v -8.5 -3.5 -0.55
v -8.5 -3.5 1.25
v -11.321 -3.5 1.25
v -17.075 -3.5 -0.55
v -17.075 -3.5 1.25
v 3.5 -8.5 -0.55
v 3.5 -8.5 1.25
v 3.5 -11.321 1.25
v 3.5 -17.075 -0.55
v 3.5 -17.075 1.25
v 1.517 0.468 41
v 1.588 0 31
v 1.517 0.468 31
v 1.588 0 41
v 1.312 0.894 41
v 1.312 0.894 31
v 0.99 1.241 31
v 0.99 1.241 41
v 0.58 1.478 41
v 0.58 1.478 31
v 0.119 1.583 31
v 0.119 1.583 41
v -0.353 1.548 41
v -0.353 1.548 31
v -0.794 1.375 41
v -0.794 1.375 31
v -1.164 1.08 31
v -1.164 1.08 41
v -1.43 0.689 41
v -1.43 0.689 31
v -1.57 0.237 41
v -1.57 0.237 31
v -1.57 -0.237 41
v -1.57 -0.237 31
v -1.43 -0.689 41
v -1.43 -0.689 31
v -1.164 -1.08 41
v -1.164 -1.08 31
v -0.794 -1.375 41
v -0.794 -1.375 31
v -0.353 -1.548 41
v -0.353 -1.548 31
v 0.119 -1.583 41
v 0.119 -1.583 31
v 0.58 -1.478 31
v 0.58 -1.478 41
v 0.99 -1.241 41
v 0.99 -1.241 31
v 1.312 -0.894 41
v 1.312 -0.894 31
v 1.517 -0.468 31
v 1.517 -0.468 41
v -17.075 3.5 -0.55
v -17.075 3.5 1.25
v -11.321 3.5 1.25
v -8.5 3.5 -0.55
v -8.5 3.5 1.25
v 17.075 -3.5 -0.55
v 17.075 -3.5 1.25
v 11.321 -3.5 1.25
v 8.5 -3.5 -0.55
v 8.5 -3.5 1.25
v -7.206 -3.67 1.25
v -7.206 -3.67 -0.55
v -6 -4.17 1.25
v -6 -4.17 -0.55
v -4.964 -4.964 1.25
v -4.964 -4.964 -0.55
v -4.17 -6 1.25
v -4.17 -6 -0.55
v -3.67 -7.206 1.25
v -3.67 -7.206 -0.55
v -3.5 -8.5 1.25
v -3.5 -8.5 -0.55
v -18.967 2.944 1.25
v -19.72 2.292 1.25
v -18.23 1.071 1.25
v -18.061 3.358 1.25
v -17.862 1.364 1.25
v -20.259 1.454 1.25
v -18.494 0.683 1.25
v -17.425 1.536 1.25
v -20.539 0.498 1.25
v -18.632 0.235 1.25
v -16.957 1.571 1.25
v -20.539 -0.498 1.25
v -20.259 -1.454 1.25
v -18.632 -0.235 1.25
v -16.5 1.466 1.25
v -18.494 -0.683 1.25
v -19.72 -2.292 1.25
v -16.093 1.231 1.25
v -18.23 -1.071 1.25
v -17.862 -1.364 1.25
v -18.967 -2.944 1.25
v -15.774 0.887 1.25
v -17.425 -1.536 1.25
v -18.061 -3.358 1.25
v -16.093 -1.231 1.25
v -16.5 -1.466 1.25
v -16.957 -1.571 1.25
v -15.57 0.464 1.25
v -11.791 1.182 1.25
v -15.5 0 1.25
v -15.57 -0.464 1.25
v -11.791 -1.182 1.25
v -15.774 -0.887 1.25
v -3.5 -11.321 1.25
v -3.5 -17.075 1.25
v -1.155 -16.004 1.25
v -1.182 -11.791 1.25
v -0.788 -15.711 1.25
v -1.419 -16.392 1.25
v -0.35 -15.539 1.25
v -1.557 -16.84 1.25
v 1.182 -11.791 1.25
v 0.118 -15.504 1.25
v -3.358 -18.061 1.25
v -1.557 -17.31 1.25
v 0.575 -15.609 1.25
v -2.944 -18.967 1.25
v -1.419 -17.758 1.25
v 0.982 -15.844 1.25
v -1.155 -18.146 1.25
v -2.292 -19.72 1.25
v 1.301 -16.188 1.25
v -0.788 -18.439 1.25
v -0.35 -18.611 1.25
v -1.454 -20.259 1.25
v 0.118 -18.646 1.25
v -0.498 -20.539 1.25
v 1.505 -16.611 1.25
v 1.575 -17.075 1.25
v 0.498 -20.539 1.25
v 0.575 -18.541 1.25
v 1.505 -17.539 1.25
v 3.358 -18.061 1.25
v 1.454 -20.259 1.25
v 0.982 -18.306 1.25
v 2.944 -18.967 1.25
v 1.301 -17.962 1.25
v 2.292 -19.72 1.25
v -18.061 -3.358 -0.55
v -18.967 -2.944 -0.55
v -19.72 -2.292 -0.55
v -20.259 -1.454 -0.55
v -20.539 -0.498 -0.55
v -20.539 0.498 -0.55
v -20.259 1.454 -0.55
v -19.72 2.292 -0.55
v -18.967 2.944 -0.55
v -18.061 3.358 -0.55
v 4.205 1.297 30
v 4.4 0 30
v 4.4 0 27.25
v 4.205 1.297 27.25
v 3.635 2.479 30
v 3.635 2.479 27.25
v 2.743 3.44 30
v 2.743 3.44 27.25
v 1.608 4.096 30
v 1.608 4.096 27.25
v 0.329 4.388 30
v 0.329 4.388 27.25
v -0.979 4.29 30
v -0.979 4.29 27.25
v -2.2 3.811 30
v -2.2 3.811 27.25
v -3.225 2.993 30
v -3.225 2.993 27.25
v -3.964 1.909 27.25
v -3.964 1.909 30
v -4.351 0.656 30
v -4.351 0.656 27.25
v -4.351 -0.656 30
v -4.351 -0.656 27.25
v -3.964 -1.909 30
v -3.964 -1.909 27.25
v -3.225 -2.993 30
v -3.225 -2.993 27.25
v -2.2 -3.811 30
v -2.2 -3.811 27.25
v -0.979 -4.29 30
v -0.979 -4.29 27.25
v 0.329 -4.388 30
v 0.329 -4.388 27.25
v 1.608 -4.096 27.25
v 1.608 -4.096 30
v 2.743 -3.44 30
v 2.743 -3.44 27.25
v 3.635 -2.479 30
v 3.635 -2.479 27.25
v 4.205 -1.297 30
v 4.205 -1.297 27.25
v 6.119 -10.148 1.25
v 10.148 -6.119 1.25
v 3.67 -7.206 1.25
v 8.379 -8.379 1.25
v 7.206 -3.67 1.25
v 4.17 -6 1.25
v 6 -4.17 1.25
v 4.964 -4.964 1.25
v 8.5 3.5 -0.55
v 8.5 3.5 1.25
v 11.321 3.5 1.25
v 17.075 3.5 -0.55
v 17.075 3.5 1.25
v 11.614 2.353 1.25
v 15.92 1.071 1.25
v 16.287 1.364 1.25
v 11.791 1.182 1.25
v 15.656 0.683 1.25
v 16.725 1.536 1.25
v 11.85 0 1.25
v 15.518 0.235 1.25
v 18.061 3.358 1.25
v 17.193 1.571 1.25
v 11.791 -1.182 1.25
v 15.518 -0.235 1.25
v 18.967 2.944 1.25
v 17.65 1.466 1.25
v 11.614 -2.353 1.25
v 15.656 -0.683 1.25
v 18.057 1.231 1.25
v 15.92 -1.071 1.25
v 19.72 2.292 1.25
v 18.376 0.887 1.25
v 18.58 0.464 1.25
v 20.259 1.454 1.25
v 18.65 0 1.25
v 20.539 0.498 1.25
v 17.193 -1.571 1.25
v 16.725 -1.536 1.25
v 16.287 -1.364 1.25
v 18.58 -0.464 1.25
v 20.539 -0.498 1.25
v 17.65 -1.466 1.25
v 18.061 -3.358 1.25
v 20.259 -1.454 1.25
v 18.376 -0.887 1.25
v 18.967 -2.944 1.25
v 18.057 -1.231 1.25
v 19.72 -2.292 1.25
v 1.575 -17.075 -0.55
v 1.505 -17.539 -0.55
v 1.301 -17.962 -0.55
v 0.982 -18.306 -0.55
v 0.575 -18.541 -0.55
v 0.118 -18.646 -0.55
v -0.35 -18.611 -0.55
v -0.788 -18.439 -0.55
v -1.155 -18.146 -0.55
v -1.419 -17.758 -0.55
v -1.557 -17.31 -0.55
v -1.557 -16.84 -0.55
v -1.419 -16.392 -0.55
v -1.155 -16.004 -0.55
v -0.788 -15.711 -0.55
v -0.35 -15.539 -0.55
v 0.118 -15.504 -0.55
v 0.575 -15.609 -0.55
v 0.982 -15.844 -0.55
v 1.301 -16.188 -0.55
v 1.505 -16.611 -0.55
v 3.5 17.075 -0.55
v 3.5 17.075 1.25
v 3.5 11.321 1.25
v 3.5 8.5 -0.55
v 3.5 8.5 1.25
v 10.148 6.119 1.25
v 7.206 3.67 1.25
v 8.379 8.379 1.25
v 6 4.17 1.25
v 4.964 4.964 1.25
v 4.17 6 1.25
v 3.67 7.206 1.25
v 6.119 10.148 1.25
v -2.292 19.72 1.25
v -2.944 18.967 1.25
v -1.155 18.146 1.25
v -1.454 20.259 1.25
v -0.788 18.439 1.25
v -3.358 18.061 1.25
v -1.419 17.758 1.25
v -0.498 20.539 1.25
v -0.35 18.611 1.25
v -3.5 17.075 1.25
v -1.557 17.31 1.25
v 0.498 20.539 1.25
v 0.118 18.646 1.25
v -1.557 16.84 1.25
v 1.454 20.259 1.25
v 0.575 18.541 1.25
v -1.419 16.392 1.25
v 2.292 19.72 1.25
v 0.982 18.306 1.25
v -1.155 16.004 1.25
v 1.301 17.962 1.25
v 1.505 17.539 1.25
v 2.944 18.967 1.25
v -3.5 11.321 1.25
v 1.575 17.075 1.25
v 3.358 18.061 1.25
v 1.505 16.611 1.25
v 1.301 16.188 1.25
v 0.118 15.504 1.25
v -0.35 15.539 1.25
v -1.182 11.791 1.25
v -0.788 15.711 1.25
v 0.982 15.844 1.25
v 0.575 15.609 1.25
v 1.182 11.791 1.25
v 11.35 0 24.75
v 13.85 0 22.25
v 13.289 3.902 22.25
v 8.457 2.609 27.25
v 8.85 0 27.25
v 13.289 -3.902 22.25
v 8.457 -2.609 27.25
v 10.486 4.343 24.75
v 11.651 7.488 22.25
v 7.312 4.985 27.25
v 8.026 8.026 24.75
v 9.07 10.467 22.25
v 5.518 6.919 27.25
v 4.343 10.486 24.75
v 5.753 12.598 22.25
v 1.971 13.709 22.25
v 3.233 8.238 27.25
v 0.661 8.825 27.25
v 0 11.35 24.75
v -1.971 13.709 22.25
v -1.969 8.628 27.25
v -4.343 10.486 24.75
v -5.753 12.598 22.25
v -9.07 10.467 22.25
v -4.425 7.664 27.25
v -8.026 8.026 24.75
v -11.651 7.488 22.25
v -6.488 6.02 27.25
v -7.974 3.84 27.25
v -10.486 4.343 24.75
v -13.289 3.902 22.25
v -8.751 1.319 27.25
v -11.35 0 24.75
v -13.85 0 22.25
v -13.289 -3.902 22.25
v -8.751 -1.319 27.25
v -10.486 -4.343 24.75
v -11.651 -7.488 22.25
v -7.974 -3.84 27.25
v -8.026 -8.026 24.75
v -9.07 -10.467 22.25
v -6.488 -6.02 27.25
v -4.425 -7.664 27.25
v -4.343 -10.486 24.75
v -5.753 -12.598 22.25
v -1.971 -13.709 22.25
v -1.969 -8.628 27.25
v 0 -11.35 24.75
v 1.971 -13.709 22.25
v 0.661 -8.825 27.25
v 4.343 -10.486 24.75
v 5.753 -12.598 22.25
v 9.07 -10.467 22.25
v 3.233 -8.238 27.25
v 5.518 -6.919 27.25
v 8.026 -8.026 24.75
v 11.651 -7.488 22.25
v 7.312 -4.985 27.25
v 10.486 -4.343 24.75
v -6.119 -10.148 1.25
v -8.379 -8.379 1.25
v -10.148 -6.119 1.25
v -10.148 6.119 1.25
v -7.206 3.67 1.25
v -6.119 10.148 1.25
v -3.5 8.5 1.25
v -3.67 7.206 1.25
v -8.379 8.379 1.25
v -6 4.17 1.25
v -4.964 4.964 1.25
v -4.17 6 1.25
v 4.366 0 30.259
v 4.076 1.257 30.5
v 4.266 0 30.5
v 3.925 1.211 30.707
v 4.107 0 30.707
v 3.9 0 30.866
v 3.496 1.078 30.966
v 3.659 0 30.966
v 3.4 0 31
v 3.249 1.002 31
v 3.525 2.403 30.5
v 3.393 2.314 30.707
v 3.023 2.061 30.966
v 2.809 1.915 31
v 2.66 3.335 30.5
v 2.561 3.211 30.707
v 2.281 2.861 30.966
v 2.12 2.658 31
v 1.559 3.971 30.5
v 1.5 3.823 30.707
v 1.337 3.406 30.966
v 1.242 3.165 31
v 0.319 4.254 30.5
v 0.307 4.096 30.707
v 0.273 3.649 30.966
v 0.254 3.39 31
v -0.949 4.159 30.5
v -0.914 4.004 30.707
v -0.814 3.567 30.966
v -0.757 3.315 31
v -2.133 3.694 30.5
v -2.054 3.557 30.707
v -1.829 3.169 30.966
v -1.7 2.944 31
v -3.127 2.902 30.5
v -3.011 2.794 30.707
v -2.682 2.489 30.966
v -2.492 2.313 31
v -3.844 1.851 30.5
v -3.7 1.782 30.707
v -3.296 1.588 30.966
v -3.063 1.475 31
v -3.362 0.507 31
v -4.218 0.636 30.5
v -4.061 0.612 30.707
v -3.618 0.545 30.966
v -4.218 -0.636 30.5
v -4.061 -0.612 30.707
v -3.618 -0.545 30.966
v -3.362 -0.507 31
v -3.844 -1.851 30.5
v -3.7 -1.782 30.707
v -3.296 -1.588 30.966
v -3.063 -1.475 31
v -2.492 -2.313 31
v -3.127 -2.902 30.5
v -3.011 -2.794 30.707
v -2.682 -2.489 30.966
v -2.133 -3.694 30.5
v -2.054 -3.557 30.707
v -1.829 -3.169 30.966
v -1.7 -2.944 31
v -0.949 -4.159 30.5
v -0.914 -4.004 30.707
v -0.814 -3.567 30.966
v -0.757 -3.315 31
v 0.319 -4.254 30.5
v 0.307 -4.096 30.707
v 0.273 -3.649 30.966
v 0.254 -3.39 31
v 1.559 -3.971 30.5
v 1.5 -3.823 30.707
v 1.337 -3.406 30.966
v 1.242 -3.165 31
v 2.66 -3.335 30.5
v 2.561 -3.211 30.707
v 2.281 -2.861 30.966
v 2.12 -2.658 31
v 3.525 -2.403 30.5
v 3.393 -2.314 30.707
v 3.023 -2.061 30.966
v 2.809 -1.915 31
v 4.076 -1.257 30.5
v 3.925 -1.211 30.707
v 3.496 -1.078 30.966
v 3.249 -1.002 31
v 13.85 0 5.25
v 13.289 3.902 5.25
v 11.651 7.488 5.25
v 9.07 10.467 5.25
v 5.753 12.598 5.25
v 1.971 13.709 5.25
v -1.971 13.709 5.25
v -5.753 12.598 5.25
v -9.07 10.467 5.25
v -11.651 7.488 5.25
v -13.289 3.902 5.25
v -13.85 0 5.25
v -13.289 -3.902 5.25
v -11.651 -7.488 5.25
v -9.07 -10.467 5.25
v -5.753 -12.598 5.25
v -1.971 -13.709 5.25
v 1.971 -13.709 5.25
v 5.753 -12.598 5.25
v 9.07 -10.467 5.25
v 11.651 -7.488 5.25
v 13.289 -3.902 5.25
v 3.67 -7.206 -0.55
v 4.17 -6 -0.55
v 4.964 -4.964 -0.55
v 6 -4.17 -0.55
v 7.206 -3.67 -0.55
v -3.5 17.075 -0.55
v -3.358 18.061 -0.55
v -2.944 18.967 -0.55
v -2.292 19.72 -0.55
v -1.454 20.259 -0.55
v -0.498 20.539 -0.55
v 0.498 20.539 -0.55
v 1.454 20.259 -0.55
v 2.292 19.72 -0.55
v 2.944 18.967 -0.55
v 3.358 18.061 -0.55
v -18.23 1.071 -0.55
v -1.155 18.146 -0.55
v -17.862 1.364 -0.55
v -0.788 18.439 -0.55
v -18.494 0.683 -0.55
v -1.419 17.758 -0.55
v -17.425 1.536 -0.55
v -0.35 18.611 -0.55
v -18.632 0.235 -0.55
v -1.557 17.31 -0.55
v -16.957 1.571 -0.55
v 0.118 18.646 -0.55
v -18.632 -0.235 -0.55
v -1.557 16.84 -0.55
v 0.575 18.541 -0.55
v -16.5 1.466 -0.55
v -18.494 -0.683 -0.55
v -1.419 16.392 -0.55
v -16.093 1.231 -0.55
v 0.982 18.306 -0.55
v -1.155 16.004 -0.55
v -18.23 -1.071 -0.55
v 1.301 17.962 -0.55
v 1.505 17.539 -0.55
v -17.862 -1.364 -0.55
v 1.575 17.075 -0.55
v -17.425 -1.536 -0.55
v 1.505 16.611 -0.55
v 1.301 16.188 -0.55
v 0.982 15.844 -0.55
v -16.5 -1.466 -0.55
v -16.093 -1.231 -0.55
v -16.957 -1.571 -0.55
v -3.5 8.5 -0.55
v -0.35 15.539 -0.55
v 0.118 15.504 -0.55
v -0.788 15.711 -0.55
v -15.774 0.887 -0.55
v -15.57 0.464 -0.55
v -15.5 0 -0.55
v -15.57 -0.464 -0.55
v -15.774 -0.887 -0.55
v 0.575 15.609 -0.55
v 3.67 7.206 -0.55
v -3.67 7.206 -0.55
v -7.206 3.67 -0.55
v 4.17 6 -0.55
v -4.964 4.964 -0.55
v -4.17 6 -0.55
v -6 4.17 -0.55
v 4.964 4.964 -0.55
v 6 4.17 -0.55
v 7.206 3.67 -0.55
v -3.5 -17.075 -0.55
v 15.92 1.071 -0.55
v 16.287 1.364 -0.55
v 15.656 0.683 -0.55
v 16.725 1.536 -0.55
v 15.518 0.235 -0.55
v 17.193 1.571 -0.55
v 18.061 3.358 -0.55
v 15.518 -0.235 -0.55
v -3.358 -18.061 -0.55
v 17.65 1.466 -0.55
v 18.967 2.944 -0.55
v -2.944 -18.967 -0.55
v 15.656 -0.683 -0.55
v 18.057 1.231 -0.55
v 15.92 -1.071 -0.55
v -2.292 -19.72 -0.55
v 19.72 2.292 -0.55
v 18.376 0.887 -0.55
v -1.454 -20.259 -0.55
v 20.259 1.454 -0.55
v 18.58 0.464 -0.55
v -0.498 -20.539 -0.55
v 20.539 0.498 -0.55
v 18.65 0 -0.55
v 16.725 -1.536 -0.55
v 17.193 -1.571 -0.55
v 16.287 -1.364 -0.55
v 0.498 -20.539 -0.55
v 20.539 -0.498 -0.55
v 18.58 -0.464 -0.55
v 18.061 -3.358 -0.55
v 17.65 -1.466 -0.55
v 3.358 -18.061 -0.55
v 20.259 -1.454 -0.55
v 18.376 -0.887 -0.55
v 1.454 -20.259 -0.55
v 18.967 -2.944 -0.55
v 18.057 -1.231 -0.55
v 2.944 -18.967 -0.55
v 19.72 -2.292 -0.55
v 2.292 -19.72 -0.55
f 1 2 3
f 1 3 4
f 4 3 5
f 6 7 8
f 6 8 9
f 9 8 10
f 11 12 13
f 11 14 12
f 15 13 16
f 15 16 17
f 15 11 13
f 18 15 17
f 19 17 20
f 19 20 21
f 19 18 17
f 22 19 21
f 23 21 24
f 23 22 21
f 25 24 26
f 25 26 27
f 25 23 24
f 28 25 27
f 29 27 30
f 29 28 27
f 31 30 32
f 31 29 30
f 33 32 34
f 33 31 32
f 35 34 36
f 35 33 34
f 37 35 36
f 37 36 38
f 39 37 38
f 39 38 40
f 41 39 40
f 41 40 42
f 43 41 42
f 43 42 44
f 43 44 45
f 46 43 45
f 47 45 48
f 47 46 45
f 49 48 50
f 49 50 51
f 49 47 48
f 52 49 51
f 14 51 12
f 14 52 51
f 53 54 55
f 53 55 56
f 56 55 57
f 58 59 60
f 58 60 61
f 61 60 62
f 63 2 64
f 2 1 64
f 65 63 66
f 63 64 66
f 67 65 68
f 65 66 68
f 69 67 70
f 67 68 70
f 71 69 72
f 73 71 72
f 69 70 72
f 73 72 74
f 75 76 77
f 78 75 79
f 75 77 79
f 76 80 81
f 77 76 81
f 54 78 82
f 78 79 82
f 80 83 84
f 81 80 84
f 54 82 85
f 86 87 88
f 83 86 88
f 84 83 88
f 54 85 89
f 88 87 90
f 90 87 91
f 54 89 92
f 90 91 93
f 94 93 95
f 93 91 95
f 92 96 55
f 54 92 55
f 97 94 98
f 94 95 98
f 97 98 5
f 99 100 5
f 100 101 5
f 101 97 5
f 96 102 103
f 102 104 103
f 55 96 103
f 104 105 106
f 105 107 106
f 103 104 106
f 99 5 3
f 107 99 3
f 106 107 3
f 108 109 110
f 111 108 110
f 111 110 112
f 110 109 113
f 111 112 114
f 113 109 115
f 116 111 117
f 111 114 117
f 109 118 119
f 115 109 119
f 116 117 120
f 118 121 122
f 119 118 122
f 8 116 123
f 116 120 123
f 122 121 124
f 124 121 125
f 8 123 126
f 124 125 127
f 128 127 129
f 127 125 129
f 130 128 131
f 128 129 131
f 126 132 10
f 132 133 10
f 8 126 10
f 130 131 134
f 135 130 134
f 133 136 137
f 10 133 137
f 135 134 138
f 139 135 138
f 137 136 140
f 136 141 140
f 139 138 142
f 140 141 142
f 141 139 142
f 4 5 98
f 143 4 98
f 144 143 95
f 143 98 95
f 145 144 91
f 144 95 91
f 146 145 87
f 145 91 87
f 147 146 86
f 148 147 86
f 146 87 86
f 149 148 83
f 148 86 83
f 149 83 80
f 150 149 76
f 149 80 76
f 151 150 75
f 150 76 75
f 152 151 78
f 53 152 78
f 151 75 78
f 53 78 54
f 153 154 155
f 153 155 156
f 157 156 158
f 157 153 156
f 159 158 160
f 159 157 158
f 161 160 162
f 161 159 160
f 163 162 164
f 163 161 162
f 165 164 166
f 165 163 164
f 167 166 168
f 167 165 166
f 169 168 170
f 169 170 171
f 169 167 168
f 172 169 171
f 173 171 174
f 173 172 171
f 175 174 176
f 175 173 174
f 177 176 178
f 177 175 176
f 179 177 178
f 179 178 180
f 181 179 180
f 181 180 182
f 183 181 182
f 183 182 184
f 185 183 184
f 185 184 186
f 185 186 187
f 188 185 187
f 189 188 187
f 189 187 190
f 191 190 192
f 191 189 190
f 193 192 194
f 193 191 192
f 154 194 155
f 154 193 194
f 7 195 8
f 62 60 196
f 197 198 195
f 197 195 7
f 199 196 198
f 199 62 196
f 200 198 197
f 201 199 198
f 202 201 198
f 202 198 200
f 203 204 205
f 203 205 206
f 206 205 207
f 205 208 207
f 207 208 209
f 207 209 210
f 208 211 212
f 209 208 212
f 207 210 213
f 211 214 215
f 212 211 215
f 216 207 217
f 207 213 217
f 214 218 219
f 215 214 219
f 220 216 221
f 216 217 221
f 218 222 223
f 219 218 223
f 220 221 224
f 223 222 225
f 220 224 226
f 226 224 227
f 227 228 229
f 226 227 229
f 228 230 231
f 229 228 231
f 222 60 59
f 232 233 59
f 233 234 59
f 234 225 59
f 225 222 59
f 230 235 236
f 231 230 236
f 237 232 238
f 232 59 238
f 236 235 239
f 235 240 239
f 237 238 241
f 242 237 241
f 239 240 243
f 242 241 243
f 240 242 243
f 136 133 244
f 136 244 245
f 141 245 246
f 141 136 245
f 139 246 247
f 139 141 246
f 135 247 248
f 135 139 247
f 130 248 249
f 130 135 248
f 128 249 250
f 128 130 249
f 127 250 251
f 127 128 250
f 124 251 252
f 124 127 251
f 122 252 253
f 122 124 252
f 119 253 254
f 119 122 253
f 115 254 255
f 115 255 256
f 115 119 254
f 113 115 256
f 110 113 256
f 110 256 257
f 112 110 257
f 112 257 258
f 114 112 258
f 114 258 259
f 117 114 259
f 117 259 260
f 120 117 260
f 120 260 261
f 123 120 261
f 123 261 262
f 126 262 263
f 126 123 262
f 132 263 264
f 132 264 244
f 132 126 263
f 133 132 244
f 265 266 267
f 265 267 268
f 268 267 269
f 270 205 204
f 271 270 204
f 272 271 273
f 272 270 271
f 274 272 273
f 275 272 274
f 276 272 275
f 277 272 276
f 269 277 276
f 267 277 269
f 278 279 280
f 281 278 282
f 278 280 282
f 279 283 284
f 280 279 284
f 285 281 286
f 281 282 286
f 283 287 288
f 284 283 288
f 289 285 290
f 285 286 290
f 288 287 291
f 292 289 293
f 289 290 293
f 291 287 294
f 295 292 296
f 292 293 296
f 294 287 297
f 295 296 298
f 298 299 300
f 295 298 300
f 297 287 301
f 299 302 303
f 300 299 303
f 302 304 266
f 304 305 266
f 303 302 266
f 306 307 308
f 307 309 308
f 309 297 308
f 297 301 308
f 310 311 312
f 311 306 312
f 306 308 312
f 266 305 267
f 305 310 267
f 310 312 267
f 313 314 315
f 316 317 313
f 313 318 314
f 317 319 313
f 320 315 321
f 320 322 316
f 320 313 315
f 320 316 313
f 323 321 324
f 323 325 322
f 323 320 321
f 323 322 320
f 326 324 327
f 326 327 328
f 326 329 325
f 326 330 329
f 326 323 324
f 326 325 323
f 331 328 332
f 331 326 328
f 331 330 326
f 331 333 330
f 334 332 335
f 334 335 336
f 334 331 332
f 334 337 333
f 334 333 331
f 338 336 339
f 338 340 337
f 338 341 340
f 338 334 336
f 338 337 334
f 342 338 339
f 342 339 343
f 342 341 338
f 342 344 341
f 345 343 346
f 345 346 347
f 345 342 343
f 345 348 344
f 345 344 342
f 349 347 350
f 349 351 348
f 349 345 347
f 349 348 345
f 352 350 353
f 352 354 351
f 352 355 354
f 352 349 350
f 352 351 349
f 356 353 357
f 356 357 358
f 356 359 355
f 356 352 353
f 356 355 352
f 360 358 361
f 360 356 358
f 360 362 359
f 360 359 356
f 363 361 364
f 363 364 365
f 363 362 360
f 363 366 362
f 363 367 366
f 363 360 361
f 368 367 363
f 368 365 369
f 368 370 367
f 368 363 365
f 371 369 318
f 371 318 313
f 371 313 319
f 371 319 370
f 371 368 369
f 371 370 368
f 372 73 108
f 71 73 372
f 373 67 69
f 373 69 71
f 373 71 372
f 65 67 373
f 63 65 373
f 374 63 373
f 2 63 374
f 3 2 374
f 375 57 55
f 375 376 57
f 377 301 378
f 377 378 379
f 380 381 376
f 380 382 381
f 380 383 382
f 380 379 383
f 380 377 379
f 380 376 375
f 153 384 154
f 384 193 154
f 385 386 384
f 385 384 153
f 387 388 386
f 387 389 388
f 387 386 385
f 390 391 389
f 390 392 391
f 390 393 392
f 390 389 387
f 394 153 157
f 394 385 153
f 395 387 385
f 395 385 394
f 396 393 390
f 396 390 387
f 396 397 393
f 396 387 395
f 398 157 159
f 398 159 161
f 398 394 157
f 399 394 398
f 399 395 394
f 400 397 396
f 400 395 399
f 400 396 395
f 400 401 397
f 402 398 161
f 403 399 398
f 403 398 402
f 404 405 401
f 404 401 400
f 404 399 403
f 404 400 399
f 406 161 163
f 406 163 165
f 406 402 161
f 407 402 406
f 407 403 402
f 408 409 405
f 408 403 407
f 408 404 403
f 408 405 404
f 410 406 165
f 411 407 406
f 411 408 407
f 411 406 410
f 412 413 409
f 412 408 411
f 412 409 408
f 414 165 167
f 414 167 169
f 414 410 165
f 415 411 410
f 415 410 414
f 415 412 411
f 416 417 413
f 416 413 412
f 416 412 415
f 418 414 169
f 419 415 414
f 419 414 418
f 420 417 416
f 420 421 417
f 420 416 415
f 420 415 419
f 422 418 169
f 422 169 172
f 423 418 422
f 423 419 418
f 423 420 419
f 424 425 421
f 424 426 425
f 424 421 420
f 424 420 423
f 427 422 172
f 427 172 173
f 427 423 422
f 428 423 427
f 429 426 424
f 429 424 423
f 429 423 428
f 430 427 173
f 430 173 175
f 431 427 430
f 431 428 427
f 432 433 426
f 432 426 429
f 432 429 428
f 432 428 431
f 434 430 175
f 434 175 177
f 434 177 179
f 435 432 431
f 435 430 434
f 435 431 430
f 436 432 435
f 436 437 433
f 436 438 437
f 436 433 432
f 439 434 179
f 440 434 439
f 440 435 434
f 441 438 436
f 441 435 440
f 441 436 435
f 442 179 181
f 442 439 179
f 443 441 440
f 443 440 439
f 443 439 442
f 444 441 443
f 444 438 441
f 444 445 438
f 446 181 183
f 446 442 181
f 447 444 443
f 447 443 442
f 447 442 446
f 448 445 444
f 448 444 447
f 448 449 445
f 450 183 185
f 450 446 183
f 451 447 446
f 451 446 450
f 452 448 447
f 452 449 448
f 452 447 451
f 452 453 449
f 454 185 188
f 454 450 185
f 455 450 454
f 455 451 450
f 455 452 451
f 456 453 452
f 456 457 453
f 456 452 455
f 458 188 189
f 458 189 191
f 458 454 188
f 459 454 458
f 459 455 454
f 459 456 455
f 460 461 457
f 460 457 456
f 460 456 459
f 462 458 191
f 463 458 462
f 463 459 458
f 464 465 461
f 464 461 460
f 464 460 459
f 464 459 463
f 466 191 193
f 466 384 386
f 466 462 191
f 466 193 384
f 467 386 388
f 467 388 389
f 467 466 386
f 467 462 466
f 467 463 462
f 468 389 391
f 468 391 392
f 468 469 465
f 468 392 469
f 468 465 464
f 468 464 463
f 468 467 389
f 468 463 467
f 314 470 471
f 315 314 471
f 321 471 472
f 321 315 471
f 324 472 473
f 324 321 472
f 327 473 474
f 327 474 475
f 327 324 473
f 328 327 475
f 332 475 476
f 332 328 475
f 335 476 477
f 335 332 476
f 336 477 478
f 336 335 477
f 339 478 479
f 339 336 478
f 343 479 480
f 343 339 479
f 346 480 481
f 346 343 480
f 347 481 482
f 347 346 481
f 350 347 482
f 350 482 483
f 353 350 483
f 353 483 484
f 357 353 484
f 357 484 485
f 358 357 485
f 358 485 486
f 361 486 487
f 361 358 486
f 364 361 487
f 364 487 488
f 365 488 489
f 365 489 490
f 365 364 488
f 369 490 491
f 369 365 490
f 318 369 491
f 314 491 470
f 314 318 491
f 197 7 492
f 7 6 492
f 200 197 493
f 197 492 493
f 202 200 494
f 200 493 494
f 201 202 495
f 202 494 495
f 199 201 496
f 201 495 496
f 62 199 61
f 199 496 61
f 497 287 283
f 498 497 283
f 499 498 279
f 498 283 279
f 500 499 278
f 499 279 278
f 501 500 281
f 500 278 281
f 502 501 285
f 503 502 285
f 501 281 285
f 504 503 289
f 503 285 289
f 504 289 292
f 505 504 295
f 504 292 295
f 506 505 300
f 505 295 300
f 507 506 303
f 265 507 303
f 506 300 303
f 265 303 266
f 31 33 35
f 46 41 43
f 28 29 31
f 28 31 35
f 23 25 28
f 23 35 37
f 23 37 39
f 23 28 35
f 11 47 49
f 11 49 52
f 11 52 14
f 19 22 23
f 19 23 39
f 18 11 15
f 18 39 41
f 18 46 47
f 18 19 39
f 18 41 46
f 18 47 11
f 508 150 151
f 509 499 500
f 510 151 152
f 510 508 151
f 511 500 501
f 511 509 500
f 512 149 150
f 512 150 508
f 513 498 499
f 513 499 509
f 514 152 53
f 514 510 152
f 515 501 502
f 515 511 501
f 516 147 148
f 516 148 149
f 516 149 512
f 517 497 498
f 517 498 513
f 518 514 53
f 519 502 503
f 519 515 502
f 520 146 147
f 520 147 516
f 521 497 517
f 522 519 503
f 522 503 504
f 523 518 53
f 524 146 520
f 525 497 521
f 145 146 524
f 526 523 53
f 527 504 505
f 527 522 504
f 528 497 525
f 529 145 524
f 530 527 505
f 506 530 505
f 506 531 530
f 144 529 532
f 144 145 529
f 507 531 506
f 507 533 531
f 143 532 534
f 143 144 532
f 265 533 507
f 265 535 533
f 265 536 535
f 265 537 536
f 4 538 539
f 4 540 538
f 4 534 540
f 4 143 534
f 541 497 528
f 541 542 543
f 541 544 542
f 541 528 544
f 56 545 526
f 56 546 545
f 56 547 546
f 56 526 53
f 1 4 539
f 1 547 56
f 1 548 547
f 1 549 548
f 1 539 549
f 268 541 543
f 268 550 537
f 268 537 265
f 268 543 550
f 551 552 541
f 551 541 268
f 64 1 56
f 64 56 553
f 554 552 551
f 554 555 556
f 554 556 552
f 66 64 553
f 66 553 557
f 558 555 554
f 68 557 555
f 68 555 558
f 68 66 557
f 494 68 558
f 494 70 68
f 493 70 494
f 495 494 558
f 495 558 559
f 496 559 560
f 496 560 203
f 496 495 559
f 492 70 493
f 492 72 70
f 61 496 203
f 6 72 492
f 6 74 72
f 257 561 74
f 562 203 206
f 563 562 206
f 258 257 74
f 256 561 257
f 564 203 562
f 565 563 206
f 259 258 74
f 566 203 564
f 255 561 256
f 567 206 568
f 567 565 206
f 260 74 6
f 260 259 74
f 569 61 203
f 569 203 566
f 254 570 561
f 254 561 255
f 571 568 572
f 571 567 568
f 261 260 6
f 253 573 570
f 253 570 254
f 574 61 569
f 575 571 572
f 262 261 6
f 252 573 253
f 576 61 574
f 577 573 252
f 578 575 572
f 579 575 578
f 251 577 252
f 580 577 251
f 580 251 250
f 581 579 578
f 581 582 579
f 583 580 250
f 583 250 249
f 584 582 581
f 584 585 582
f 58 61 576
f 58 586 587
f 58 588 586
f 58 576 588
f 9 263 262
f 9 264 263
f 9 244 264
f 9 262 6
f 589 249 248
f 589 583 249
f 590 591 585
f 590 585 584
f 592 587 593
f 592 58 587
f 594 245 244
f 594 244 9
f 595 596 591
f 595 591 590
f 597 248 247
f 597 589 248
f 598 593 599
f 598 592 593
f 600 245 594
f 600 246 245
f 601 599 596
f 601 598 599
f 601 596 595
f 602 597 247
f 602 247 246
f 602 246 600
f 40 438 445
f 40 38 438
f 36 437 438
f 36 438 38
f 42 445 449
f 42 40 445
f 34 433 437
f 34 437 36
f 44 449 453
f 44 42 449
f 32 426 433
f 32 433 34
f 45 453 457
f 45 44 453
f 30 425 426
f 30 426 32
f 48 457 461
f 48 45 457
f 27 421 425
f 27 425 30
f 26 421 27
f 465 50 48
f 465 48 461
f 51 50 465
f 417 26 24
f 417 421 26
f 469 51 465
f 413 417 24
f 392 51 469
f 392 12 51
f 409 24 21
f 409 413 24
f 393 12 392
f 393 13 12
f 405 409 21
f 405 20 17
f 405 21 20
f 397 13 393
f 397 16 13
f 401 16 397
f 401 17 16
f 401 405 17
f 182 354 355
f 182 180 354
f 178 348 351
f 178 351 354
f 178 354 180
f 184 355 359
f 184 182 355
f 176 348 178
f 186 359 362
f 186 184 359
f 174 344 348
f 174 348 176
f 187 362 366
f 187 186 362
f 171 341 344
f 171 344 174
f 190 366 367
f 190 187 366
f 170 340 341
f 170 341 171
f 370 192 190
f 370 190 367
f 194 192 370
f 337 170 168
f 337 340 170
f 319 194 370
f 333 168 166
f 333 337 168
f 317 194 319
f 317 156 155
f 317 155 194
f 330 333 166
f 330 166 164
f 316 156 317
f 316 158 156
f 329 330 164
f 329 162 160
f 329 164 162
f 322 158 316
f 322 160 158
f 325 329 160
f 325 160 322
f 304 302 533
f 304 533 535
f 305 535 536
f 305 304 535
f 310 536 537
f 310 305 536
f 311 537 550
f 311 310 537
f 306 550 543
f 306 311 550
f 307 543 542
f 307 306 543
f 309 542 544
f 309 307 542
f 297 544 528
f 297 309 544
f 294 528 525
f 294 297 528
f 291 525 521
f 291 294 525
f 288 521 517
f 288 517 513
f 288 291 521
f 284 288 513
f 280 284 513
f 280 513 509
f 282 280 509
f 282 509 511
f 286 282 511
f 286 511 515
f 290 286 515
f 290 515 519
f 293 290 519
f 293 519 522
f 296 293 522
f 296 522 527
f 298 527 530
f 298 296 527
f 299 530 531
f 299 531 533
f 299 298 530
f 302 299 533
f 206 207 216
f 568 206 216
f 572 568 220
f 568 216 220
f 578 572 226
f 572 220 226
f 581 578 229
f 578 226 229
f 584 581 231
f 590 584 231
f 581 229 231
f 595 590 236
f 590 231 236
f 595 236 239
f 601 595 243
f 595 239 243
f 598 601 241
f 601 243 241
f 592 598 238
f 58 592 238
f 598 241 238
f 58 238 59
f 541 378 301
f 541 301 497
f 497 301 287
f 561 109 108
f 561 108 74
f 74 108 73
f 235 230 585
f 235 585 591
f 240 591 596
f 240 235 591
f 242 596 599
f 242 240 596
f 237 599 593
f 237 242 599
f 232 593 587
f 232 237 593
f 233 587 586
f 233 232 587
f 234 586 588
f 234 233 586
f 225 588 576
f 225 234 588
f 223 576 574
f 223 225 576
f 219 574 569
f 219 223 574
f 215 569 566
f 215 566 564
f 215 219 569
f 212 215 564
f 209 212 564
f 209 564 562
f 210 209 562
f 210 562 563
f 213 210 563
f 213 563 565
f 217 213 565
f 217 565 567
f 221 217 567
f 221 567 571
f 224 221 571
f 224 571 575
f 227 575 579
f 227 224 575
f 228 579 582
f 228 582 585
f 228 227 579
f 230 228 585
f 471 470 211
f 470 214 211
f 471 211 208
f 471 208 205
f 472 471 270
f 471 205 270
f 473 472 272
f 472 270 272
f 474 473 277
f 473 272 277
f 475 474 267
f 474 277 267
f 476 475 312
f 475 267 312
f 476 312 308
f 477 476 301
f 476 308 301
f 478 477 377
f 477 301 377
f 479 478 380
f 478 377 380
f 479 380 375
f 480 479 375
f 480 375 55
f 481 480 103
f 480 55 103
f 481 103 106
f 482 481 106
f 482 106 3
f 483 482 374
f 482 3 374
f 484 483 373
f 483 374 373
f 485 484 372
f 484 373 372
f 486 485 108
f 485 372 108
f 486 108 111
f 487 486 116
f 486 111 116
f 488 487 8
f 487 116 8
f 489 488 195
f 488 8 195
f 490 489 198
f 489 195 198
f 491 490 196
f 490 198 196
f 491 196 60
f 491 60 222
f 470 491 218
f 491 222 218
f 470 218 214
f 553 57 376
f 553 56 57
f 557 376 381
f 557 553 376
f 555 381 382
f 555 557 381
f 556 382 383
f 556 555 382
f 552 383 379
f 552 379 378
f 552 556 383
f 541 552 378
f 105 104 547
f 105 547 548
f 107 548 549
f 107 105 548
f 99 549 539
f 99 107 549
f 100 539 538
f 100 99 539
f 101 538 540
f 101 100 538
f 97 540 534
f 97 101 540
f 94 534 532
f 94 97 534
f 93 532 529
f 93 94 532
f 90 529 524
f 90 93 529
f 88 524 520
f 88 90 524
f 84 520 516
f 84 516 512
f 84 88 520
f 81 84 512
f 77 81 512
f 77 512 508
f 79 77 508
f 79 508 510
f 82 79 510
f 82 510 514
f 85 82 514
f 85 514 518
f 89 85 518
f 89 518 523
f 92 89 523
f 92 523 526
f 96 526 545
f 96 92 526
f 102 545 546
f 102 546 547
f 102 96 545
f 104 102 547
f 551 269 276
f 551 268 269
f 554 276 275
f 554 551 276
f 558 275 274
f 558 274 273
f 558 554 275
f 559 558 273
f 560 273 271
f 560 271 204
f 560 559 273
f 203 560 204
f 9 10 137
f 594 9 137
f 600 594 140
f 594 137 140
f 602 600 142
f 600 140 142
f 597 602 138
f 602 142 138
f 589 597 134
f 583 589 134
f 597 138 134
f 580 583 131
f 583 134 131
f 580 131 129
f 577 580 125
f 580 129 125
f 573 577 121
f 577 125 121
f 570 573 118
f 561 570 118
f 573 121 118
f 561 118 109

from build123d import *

# Parameters (mm, degrees)
F2_SIZE  = 5
F3_SIZE2 = 2
F3_SIZE  = 4
F4_R     = 1
F5_R     = 1.575
F6_DEPTH = 1.8
F7_R     = 5


with BuildPart() as f1:
    # F0 (on Front) → F1 (revolve)
    with BuildSketch(Plane.XZ):
        Polygon((0, 41), (0, 0), (2.2364340257, 0), (2.2364340257, 1.25), (13.85, 1.25), (13.85, 27.25), (4.4, 27.25), (4.4, 31), (1.5875, 31), (1.5875, 41), align=None)
    revolve(axis=Axis((0, 0, 53.8787767291), (0, 0, 1)))

    # F2
    f2_edges = [f1.edges().sort_by_distance(p)[0] for p in [
        (-13.85, 0, 27.25),
    ]]
    chamfer(f2_edges, length=F2_SIZE)

    # F3
    f3_edges = [f1.edges().sort_by_distance(p)[0] for p in [
        (-13.85, 0, 1.25),
    ]]
    f3_side = f1.faces().sort_by_distance((-13.85, 0, 11.75))[0]
    chamfer(f3_edges, length=F3_SIZE, length2=F3_SIZE2, reference=f3_side)

    # F4
    f4_edges = [f1.edges().sort_by_distance(p)[0] for p in [
        (-4.4, 0, 31),
    ]]
    fillet(f4_edges, radius=F4_R)

    # F5 (on face) → F6 (join)
    with BuildSketch(Plane(origin=(0, 0, 1.25), x_dir=(1, 0, 0), z_dir=(0, 0, -1))):
        with BuildLine():
            Line((-3.5, 3.5), (-17.075, 3.5))
            ThreePointArc((-17.075, 3.5), (-20.575, 0), (-17.075, -3.5))
            Line((-17.075, -3.5), (-3.5, -3.5))
            Line((-3.5, -3.5), (-3.5, -17.075))
            ThreePointArc((-3.5, -17.075), (0, -20.575), (3.5, -17.075))
            Line((3.5, -17.075), (3.5, -3.5))
            Line((3.5, -3.5), (17.075, -3.5))
            ThreePointArc((17.075, -3.5), (20.575, 0), (17.075, 3.5))
            Line((17.075, 3.5), (3.5, 3.5))
            Line((3.5, 3.5), (3.5, 17.075))
            ThreePointArc((3.5, 17.075), (0, 20.575), (-3.5, 17.075))
            Line((-3.5, 17.075), (-3.5, 3.5))
        make_face()
        with Locations((0, -17.075)):
            Circle(F5_R, mode=Mode.SUBTRACT)
        with Locations((-17.075, 0)):
            Circle(F5_R, mode=Mode.SUBTRACT)
        with Locations((17.075, 0)):
            Circle(F5_R, mode=Mode.SUBTRACT)
        with Locations((0, 17.075)):
            Circle(F5_R, mode=Mode.SUBTRACT)
    extrude(amount=F6_DEPTH)

    # F7
    f7_edges = [f1.edges().sort_by_distance(p)[0] for p in [
        (-3.5, -3.5, 0.35),
        (-3.5, 3.5, 0.35),
        (3.5, 3.5, 0.35),
        (3.5, -3.5, 0.35),
    ]]
    fillet(f7_edges, radius=F7_R)


solid = f1.part
